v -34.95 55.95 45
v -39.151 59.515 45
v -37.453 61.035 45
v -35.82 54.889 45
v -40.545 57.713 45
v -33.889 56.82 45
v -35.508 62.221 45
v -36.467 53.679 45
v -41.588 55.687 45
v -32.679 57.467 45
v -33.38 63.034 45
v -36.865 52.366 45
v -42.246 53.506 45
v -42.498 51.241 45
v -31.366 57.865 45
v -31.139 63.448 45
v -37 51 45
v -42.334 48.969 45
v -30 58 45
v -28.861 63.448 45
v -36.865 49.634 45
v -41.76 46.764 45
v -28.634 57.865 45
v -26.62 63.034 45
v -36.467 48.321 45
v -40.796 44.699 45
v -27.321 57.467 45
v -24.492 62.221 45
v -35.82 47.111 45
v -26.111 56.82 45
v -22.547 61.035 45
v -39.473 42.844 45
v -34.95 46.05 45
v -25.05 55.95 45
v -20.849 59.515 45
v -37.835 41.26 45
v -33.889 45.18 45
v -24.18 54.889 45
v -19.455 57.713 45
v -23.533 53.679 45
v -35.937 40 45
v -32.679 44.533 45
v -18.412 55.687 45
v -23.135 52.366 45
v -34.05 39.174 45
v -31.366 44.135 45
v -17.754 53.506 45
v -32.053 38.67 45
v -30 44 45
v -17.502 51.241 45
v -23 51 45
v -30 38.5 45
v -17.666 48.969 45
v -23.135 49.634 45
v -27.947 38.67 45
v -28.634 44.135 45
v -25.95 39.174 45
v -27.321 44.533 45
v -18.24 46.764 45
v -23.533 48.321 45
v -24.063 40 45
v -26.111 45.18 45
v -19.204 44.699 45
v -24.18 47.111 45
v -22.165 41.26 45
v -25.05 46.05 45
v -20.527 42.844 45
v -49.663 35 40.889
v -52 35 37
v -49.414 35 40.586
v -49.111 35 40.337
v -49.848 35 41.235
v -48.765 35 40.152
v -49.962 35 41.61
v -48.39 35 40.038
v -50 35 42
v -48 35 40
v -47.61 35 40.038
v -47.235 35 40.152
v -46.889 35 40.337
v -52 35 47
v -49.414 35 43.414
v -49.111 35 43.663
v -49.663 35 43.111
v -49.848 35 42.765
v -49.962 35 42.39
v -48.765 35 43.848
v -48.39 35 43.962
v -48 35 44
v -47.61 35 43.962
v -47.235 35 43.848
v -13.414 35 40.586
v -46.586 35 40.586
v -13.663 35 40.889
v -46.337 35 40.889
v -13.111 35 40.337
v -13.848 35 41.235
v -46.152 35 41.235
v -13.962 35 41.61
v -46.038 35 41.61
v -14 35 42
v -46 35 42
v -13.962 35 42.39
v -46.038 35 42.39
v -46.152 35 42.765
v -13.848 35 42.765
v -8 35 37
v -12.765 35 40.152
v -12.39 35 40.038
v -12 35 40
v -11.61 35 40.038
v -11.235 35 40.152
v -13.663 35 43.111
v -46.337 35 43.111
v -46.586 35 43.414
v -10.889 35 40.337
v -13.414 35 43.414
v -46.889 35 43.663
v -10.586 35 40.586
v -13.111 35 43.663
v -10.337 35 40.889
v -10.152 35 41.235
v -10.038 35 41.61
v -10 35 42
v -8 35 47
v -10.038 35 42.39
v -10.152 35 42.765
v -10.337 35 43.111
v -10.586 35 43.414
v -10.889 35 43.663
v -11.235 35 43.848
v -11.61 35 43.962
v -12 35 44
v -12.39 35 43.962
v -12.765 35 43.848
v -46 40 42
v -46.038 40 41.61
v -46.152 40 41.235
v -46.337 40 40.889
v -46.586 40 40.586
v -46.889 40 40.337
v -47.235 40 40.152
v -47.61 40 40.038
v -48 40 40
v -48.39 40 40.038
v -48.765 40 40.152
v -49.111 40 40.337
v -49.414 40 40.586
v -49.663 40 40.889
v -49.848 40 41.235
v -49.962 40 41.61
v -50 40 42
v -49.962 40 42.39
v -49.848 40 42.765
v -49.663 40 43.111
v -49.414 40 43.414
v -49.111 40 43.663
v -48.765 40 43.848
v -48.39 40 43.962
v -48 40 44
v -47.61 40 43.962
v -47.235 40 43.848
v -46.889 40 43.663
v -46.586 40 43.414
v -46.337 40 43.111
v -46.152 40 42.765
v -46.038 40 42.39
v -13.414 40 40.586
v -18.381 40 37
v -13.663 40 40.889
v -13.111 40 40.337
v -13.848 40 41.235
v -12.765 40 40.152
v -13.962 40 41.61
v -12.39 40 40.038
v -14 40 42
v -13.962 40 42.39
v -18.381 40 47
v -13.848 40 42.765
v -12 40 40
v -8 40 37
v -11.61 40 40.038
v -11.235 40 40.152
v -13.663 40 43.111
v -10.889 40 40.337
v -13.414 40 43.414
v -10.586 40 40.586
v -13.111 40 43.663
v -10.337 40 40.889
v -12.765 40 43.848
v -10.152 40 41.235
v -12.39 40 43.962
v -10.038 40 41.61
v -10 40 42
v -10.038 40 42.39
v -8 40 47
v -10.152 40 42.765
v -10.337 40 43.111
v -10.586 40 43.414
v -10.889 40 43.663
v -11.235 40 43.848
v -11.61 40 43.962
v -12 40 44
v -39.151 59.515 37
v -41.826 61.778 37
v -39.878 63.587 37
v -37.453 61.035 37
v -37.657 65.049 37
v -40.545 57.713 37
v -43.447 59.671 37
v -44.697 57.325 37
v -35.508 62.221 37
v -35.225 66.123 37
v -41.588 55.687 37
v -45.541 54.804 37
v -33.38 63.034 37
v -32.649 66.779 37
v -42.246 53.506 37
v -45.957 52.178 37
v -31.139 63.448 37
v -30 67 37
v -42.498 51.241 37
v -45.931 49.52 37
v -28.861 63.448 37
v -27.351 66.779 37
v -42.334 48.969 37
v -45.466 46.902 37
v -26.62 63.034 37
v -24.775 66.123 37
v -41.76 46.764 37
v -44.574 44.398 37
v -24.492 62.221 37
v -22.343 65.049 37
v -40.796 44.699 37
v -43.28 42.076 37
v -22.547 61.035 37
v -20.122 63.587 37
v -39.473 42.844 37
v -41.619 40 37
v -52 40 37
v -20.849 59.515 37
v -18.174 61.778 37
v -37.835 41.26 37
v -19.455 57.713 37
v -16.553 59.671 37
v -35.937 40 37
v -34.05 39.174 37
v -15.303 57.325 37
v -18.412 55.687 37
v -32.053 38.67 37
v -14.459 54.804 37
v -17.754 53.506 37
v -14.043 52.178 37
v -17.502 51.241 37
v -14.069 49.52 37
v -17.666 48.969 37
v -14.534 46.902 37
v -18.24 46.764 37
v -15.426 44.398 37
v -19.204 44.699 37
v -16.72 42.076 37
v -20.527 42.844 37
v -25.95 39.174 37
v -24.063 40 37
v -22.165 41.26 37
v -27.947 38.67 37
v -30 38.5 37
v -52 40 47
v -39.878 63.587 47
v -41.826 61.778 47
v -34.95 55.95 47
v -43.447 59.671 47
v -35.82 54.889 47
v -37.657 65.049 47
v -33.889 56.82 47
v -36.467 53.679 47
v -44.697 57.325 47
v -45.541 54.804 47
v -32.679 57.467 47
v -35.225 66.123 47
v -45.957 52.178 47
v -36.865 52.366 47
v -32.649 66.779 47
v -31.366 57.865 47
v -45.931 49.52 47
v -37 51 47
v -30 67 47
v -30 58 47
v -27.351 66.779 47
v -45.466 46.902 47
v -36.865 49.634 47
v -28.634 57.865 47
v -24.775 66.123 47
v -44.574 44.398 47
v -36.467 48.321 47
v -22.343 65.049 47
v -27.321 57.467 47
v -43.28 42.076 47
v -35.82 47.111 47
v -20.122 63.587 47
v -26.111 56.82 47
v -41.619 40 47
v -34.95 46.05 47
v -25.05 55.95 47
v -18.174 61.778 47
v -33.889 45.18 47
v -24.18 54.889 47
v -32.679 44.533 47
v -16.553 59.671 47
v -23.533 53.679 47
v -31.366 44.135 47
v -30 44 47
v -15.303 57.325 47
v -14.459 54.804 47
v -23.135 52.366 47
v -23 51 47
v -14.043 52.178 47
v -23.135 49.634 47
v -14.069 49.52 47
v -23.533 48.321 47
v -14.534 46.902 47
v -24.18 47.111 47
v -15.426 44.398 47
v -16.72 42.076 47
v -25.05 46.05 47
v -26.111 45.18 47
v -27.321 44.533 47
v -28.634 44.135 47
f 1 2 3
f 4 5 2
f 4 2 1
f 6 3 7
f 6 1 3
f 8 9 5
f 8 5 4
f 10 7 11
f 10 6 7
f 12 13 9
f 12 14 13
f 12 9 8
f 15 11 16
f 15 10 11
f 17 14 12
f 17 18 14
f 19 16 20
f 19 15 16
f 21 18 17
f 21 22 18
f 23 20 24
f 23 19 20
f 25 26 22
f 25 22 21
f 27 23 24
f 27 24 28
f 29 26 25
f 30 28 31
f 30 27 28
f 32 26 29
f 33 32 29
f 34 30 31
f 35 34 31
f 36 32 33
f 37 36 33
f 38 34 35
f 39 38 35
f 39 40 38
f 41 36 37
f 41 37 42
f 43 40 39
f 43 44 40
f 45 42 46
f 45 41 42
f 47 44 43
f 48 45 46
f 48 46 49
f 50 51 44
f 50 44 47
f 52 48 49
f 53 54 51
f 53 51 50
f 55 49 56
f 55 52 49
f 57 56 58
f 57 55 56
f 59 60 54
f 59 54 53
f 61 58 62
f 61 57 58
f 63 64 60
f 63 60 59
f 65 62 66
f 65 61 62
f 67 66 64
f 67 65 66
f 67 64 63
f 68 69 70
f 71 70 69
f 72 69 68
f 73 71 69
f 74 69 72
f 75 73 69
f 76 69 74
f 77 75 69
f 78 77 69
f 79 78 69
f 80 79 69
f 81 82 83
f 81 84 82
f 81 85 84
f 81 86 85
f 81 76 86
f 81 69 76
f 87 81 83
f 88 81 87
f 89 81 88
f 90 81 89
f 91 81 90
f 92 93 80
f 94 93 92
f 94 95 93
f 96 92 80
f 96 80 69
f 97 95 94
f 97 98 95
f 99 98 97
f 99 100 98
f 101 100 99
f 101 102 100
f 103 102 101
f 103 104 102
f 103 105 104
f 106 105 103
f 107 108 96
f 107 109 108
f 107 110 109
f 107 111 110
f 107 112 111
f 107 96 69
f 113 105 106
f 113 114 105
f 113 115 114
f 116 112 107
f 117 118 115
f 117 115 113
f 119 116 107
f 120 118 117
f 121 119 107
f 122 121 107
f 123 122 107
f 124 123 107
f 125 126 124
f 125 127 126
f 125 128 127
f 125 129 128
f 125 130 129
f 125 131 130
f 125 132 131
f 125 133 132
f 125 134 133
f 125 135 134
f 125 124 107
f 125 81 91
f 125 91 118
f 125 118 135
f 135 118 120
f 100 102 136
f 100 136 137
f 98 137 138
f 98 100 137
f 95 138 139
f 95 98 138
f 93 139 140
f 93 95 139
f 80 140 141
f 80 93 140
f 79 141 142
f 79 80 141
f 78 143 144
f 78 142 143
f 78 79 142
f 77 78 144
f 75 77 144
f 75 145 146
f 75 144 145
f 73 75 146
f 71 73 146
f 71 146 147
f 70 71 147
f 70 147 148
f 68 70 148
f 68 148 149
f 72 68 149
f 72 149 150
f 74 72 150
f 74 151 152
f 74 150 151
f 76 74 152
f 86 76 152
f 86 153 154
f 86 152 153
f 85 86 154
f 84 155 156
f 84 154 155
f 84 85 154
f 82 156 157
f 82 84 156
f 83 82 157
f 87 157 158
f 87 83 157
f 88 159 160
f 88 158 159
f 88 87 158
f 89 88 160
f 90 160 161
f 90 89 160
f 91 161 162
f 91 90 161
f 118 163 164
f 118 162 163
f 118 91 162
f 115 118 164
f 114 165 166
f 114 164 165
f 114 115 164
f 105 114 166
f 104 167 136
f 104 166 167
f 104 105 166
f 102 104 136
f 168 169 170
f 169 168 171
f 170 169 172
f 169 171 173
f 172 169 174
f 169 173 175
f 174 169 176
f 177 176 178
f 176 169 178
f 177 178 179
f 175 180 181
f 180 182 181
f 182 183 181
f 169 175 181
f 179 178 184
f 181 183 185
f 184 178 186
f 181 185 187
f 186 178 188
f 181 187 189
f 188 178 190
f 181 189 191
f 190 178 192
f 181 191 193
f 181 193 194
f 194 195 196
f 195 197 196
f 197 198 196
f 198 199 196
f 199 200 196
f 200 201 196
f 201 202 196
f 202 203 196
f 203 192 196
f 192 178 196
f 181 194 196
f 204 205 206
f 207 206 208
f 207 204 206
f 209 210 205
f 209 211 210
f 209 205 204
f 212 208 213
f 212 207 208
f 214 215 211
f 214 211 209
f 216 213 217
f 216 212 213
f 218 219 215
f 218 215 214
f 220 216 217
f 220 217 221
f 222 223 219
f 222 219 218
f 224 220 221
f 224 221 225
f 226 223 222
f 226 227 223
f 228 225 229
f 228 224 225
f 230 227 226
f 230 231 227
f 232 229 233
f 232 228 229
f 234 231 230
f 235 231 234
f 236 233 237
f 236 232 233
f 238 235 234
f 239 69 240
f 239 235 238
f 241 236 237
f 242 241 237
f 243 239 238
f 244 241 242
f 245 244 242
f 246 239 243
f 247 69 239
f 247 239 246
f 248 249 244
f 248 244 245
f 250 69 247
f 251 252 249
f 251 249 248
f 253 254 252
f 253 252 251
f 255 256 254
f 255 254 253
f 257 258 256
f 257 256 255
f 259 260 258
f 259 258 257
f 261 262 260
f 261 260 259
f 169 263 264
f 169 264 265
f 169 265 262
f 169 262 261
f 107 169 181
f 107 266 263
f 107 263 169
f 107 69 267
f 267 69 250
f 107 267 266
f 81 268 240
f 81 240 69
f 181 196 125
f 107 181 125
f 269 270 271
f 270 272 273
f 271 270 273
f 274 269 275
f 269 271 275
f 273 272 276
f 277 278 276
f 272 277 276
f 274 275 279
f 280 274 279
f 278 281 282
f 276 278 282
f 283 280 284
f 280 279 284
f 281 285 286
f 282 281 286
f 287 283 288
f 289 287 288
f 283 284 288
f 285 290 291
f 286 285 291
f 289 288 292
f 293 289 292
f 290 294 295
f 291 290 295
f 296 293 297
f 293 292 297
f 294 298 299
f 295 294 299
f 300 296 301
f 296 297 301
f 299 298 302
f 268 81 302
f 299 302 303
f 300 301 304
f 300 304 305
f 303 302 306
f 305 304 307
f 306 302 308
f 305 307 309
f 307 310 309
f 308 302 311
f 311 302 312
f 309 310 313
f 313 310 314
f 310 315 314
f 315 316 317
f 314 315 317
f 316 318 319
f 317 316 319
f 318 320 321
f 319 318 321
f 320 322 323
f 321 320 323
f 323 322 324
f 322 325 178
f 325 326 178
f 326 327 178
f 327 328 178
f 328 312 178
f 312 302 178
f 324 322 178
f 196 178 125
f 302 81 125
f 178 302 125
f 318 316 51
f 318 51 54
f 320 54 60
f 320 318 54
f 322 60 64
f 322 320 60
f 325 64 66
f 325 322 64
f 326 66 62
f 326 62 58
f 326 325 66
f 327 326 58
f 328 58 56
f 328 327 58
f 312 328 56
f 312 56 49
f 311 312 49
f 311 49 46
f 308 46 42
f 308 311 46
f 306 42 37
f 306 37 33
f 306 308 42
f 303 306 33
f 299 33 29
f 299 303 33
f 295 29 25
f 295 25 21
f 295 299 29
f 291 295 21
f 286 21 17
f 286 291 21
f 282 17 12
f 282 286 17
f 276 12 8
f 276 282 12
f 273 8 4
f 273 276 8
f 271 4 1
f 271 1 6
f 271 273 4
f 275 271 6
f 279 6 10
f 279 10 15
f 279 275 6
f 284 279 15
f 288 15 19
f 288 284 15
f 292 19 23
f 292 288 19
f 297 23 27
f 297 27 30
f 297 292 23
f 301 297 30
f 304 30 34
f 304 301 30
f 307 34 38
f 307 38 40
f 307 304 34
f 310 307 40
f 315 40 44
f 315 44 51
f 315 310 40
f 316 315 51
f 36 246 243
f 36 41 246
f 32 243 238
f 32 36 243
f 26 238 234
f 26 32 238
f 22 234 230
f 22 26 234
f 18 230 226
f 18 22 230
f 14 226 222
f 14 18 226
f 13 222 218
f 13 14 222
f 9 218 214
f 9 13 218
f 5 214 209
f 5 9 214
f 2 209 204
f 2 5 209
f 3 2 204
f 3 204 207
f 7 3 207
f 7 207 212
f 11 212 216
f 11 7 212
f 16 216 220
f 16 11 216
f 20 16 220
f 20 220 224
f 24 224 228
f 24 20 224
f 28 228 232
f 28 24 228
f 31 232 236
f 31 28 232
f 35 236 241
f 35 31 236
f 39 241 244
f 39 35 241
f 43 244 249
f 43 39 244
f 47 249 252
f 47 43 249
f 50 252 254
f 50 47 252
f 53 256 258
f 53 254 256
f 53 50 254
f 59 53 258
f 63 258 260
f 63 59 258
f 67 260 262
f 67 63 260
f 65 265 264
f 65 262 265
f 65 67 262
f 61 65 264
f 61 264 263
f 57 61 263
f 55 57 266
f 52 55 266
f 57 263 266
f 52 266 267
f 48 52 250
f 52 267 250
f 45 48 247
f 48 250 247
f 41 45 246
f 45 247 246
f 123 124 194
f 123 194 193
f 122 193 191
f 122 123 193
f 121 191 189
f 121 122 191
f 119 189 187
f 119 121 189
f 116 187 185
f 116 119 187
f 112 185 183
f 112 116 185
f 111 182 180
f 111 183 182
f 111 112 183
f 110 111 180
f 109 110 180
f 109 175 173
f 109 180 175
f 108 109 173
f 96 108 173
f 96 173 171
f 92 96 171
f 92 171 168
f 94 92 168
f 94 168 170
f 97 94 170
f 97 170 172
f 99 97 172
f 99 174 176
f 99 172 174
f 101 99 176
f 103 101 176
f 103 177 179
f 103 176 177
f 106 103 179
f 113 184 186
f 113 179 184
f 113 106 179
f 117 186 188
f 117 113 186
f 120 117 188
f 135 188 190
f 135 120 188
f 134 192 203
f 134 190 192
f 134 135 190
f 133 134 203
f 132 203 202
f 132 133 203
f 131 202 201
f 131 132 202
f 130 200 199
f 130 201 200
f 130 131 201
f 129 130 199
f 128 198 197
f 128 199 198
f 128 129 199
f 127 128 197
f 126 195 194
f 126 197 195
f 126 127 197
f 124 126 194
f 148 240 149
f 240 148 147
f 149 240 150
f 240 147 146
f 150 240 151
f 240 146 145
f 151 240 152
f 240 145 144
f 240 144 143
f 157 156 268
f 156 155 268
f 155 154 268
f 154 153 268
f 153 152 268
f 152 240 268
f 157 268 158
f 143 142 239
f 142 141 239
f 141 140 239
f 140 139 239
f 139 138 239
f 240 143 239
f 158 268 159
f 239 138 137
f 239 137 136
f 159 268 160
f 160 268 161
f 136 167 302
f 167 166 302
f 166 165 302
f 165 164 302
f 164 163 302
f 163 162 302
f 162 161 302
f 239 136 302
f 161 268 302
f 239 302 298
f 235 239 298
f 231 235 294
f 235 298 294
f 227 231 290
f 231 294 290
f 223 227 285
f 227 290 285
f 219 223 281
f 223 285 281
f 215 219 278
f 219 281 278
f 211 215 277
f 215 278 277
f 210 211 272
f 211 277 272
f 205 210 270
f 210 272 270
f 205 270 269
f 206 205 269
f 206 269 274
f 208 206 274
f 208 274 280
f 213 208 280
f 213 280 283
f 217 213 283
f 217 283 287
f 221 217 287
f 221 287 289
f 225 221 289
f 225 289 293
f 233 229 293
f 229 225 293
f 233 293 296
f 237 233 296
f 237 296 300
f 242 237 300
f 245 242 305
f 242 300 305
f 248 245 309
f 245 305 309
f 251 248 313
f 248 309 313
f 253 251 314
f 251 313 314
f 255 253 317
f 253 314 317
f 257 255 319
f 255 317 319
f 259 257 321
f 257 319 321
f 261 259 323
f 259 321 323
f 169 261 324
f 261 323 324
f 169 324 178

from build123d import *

# Parameters (mm, degrees)
CYLINDER032_R             = 12.5
CYLINDER032_DEPTH         = 35
CYLINDER030_R             = 16
CYLINDER030_DEPTH         = 10
CYLINDER033_R             = 7
CYLINDER033_DEPTH         = 2
CYLINDER034_R             = 14
CYLINDER034_DEPTH         = 2
CYLINDER031_R             = 2
CYLINDER031_DEPTH         = 10
CYLINDER031_ROLL_ANGLE    = 90
ARRAY004_X_COUNT          = 2
ARRAY004_X_PITCH          = 36
BOX014_W                  = 44
BOX014_H                  = 5
BOX014_DEPTH              = 10
POCKET_DEPTH              = 8
FUSION026_PLACEMENT_ANGLE = 180


with BuildPart() as cylinder032:
    # Cylinder032 → Cylinder032 (new body)
    with BuildSketch(Plane.XY):
        Circle(CYLINDER032_R)
    extrude(amount=CYLINDER032_DEPTH)


with BuildPart() as cuerpo_arandela001:
    # Cylinder030 → Cylinder030 (new body)
    with BuildSketch(Plane.XY):
        Circle(CYLINDER030_R)
    extrude(amount=CYLINDER030_DEPTH)

    # Cut004024: cut Cylinder032
    add(cylinder032.part, mode=Mode.SUBTRACT)


with BuildPart() as cylinder033:
    # Cylinder033 → Cylinder033 (new body)
    with BuildSketch(Plane.XY):
        Circle(CYLINDER033_R)
    extrude(amount=CYLINDER033_DEPTH)


with BuildPart() as tapa_arandela001:
    # Cylinder034 → Cylinder034 (new body)
    with BuildSketch(Plane.XY):
        Circle(CYLINDER034_R)
    extrude(amount=CYLINDER034_DEPTH)

    # Cut004025: cut Cylinder033
    add(cylinder033.part, mode=Mode.SUBTRACT)


with BuildPart() as array004:
    # Cylinder031 → Cylinder031 (new body)
    with BuildSketch(Plane.XY):
        Circle(CYLINDER031_R)
    extrude(amount=CYLINDER031_DEPTH)


with BuildPart() as array004_1:
    # Cylinder031 roll: moved
    add(array004.part.rotate(Axis((0, 0, 0), (1, 0, 0)), CYLINDER031_ROLL_ANGLE))


with BuildPart() as array004_2:
    # Cylinder031 placement: moved
    add(array004_1.part.moved(Location((18, 8, 5))))

    # Array004 X: Array004 ×2


with BuildPart() as array004_3:
    add(array004_2.part)
    with Locations(*[(-i * ARRAY004_X_PITCH, 0, 0) for i in range(1, ARRAY004_X_COUNT)]):
        add(array004_2.part)


with BuildPart() as porta_rodamiento_grande:
    # Box014 → Box014 (new body)
    with BuildSketch(Plane(origin=(-22, 0, 0), x_dir=(1, 0, 0), z_dir=(0, 0, 1))):
        with Locations((22, 2.5)):
            Rectangle(BOX014_W, BOX014_H)
    extrude(amount=BOX014_DEPTH)

    # Cut004026: cut Array004
    add(array004_3.part, mode=Mode.SUBTRACT)


with BuildPart() as porta_rodamiento_grande_1:
    # Cut004026 placement: moved
    add(porta_rodamiento_grande.part.moved(Location((0, 11, 0))))

    # Sketch001 → Pocket (cut)
    with BuildSketch(Plane(origin=(0, 11, 10), x_dir=(1, 0, 0), z_dir=(0, 0, 1))):
        with BuildLine():
            ThreePointArc((5.937171, 0), (0, 1.5), (-5.937171, 0))
            Line((-5.937171, 0), (5.937171, 0))
        make_face()
    extrude(amount=-POCKET_DEPTH, mode=Mode.SUBTRACT)

    # Fusion026: union cuerpo-arandela001, tapa-arandela001
    add(cuerpo_arandela001.part)
    add(tapa_arandela001.part)


with BuildPart() as porta_rodamiento_grande_2:
    # Fusion026 placement: moved
    add(porta_rodamiento_grande_1.part.moved(Location((-30, 51, 47))).rotate(Axis((-30, 51, 47), (1, 0, 0)), FUSION026_PLACEMENT_ANGLE))


solid = porta_rodamiento_grande_2.part
